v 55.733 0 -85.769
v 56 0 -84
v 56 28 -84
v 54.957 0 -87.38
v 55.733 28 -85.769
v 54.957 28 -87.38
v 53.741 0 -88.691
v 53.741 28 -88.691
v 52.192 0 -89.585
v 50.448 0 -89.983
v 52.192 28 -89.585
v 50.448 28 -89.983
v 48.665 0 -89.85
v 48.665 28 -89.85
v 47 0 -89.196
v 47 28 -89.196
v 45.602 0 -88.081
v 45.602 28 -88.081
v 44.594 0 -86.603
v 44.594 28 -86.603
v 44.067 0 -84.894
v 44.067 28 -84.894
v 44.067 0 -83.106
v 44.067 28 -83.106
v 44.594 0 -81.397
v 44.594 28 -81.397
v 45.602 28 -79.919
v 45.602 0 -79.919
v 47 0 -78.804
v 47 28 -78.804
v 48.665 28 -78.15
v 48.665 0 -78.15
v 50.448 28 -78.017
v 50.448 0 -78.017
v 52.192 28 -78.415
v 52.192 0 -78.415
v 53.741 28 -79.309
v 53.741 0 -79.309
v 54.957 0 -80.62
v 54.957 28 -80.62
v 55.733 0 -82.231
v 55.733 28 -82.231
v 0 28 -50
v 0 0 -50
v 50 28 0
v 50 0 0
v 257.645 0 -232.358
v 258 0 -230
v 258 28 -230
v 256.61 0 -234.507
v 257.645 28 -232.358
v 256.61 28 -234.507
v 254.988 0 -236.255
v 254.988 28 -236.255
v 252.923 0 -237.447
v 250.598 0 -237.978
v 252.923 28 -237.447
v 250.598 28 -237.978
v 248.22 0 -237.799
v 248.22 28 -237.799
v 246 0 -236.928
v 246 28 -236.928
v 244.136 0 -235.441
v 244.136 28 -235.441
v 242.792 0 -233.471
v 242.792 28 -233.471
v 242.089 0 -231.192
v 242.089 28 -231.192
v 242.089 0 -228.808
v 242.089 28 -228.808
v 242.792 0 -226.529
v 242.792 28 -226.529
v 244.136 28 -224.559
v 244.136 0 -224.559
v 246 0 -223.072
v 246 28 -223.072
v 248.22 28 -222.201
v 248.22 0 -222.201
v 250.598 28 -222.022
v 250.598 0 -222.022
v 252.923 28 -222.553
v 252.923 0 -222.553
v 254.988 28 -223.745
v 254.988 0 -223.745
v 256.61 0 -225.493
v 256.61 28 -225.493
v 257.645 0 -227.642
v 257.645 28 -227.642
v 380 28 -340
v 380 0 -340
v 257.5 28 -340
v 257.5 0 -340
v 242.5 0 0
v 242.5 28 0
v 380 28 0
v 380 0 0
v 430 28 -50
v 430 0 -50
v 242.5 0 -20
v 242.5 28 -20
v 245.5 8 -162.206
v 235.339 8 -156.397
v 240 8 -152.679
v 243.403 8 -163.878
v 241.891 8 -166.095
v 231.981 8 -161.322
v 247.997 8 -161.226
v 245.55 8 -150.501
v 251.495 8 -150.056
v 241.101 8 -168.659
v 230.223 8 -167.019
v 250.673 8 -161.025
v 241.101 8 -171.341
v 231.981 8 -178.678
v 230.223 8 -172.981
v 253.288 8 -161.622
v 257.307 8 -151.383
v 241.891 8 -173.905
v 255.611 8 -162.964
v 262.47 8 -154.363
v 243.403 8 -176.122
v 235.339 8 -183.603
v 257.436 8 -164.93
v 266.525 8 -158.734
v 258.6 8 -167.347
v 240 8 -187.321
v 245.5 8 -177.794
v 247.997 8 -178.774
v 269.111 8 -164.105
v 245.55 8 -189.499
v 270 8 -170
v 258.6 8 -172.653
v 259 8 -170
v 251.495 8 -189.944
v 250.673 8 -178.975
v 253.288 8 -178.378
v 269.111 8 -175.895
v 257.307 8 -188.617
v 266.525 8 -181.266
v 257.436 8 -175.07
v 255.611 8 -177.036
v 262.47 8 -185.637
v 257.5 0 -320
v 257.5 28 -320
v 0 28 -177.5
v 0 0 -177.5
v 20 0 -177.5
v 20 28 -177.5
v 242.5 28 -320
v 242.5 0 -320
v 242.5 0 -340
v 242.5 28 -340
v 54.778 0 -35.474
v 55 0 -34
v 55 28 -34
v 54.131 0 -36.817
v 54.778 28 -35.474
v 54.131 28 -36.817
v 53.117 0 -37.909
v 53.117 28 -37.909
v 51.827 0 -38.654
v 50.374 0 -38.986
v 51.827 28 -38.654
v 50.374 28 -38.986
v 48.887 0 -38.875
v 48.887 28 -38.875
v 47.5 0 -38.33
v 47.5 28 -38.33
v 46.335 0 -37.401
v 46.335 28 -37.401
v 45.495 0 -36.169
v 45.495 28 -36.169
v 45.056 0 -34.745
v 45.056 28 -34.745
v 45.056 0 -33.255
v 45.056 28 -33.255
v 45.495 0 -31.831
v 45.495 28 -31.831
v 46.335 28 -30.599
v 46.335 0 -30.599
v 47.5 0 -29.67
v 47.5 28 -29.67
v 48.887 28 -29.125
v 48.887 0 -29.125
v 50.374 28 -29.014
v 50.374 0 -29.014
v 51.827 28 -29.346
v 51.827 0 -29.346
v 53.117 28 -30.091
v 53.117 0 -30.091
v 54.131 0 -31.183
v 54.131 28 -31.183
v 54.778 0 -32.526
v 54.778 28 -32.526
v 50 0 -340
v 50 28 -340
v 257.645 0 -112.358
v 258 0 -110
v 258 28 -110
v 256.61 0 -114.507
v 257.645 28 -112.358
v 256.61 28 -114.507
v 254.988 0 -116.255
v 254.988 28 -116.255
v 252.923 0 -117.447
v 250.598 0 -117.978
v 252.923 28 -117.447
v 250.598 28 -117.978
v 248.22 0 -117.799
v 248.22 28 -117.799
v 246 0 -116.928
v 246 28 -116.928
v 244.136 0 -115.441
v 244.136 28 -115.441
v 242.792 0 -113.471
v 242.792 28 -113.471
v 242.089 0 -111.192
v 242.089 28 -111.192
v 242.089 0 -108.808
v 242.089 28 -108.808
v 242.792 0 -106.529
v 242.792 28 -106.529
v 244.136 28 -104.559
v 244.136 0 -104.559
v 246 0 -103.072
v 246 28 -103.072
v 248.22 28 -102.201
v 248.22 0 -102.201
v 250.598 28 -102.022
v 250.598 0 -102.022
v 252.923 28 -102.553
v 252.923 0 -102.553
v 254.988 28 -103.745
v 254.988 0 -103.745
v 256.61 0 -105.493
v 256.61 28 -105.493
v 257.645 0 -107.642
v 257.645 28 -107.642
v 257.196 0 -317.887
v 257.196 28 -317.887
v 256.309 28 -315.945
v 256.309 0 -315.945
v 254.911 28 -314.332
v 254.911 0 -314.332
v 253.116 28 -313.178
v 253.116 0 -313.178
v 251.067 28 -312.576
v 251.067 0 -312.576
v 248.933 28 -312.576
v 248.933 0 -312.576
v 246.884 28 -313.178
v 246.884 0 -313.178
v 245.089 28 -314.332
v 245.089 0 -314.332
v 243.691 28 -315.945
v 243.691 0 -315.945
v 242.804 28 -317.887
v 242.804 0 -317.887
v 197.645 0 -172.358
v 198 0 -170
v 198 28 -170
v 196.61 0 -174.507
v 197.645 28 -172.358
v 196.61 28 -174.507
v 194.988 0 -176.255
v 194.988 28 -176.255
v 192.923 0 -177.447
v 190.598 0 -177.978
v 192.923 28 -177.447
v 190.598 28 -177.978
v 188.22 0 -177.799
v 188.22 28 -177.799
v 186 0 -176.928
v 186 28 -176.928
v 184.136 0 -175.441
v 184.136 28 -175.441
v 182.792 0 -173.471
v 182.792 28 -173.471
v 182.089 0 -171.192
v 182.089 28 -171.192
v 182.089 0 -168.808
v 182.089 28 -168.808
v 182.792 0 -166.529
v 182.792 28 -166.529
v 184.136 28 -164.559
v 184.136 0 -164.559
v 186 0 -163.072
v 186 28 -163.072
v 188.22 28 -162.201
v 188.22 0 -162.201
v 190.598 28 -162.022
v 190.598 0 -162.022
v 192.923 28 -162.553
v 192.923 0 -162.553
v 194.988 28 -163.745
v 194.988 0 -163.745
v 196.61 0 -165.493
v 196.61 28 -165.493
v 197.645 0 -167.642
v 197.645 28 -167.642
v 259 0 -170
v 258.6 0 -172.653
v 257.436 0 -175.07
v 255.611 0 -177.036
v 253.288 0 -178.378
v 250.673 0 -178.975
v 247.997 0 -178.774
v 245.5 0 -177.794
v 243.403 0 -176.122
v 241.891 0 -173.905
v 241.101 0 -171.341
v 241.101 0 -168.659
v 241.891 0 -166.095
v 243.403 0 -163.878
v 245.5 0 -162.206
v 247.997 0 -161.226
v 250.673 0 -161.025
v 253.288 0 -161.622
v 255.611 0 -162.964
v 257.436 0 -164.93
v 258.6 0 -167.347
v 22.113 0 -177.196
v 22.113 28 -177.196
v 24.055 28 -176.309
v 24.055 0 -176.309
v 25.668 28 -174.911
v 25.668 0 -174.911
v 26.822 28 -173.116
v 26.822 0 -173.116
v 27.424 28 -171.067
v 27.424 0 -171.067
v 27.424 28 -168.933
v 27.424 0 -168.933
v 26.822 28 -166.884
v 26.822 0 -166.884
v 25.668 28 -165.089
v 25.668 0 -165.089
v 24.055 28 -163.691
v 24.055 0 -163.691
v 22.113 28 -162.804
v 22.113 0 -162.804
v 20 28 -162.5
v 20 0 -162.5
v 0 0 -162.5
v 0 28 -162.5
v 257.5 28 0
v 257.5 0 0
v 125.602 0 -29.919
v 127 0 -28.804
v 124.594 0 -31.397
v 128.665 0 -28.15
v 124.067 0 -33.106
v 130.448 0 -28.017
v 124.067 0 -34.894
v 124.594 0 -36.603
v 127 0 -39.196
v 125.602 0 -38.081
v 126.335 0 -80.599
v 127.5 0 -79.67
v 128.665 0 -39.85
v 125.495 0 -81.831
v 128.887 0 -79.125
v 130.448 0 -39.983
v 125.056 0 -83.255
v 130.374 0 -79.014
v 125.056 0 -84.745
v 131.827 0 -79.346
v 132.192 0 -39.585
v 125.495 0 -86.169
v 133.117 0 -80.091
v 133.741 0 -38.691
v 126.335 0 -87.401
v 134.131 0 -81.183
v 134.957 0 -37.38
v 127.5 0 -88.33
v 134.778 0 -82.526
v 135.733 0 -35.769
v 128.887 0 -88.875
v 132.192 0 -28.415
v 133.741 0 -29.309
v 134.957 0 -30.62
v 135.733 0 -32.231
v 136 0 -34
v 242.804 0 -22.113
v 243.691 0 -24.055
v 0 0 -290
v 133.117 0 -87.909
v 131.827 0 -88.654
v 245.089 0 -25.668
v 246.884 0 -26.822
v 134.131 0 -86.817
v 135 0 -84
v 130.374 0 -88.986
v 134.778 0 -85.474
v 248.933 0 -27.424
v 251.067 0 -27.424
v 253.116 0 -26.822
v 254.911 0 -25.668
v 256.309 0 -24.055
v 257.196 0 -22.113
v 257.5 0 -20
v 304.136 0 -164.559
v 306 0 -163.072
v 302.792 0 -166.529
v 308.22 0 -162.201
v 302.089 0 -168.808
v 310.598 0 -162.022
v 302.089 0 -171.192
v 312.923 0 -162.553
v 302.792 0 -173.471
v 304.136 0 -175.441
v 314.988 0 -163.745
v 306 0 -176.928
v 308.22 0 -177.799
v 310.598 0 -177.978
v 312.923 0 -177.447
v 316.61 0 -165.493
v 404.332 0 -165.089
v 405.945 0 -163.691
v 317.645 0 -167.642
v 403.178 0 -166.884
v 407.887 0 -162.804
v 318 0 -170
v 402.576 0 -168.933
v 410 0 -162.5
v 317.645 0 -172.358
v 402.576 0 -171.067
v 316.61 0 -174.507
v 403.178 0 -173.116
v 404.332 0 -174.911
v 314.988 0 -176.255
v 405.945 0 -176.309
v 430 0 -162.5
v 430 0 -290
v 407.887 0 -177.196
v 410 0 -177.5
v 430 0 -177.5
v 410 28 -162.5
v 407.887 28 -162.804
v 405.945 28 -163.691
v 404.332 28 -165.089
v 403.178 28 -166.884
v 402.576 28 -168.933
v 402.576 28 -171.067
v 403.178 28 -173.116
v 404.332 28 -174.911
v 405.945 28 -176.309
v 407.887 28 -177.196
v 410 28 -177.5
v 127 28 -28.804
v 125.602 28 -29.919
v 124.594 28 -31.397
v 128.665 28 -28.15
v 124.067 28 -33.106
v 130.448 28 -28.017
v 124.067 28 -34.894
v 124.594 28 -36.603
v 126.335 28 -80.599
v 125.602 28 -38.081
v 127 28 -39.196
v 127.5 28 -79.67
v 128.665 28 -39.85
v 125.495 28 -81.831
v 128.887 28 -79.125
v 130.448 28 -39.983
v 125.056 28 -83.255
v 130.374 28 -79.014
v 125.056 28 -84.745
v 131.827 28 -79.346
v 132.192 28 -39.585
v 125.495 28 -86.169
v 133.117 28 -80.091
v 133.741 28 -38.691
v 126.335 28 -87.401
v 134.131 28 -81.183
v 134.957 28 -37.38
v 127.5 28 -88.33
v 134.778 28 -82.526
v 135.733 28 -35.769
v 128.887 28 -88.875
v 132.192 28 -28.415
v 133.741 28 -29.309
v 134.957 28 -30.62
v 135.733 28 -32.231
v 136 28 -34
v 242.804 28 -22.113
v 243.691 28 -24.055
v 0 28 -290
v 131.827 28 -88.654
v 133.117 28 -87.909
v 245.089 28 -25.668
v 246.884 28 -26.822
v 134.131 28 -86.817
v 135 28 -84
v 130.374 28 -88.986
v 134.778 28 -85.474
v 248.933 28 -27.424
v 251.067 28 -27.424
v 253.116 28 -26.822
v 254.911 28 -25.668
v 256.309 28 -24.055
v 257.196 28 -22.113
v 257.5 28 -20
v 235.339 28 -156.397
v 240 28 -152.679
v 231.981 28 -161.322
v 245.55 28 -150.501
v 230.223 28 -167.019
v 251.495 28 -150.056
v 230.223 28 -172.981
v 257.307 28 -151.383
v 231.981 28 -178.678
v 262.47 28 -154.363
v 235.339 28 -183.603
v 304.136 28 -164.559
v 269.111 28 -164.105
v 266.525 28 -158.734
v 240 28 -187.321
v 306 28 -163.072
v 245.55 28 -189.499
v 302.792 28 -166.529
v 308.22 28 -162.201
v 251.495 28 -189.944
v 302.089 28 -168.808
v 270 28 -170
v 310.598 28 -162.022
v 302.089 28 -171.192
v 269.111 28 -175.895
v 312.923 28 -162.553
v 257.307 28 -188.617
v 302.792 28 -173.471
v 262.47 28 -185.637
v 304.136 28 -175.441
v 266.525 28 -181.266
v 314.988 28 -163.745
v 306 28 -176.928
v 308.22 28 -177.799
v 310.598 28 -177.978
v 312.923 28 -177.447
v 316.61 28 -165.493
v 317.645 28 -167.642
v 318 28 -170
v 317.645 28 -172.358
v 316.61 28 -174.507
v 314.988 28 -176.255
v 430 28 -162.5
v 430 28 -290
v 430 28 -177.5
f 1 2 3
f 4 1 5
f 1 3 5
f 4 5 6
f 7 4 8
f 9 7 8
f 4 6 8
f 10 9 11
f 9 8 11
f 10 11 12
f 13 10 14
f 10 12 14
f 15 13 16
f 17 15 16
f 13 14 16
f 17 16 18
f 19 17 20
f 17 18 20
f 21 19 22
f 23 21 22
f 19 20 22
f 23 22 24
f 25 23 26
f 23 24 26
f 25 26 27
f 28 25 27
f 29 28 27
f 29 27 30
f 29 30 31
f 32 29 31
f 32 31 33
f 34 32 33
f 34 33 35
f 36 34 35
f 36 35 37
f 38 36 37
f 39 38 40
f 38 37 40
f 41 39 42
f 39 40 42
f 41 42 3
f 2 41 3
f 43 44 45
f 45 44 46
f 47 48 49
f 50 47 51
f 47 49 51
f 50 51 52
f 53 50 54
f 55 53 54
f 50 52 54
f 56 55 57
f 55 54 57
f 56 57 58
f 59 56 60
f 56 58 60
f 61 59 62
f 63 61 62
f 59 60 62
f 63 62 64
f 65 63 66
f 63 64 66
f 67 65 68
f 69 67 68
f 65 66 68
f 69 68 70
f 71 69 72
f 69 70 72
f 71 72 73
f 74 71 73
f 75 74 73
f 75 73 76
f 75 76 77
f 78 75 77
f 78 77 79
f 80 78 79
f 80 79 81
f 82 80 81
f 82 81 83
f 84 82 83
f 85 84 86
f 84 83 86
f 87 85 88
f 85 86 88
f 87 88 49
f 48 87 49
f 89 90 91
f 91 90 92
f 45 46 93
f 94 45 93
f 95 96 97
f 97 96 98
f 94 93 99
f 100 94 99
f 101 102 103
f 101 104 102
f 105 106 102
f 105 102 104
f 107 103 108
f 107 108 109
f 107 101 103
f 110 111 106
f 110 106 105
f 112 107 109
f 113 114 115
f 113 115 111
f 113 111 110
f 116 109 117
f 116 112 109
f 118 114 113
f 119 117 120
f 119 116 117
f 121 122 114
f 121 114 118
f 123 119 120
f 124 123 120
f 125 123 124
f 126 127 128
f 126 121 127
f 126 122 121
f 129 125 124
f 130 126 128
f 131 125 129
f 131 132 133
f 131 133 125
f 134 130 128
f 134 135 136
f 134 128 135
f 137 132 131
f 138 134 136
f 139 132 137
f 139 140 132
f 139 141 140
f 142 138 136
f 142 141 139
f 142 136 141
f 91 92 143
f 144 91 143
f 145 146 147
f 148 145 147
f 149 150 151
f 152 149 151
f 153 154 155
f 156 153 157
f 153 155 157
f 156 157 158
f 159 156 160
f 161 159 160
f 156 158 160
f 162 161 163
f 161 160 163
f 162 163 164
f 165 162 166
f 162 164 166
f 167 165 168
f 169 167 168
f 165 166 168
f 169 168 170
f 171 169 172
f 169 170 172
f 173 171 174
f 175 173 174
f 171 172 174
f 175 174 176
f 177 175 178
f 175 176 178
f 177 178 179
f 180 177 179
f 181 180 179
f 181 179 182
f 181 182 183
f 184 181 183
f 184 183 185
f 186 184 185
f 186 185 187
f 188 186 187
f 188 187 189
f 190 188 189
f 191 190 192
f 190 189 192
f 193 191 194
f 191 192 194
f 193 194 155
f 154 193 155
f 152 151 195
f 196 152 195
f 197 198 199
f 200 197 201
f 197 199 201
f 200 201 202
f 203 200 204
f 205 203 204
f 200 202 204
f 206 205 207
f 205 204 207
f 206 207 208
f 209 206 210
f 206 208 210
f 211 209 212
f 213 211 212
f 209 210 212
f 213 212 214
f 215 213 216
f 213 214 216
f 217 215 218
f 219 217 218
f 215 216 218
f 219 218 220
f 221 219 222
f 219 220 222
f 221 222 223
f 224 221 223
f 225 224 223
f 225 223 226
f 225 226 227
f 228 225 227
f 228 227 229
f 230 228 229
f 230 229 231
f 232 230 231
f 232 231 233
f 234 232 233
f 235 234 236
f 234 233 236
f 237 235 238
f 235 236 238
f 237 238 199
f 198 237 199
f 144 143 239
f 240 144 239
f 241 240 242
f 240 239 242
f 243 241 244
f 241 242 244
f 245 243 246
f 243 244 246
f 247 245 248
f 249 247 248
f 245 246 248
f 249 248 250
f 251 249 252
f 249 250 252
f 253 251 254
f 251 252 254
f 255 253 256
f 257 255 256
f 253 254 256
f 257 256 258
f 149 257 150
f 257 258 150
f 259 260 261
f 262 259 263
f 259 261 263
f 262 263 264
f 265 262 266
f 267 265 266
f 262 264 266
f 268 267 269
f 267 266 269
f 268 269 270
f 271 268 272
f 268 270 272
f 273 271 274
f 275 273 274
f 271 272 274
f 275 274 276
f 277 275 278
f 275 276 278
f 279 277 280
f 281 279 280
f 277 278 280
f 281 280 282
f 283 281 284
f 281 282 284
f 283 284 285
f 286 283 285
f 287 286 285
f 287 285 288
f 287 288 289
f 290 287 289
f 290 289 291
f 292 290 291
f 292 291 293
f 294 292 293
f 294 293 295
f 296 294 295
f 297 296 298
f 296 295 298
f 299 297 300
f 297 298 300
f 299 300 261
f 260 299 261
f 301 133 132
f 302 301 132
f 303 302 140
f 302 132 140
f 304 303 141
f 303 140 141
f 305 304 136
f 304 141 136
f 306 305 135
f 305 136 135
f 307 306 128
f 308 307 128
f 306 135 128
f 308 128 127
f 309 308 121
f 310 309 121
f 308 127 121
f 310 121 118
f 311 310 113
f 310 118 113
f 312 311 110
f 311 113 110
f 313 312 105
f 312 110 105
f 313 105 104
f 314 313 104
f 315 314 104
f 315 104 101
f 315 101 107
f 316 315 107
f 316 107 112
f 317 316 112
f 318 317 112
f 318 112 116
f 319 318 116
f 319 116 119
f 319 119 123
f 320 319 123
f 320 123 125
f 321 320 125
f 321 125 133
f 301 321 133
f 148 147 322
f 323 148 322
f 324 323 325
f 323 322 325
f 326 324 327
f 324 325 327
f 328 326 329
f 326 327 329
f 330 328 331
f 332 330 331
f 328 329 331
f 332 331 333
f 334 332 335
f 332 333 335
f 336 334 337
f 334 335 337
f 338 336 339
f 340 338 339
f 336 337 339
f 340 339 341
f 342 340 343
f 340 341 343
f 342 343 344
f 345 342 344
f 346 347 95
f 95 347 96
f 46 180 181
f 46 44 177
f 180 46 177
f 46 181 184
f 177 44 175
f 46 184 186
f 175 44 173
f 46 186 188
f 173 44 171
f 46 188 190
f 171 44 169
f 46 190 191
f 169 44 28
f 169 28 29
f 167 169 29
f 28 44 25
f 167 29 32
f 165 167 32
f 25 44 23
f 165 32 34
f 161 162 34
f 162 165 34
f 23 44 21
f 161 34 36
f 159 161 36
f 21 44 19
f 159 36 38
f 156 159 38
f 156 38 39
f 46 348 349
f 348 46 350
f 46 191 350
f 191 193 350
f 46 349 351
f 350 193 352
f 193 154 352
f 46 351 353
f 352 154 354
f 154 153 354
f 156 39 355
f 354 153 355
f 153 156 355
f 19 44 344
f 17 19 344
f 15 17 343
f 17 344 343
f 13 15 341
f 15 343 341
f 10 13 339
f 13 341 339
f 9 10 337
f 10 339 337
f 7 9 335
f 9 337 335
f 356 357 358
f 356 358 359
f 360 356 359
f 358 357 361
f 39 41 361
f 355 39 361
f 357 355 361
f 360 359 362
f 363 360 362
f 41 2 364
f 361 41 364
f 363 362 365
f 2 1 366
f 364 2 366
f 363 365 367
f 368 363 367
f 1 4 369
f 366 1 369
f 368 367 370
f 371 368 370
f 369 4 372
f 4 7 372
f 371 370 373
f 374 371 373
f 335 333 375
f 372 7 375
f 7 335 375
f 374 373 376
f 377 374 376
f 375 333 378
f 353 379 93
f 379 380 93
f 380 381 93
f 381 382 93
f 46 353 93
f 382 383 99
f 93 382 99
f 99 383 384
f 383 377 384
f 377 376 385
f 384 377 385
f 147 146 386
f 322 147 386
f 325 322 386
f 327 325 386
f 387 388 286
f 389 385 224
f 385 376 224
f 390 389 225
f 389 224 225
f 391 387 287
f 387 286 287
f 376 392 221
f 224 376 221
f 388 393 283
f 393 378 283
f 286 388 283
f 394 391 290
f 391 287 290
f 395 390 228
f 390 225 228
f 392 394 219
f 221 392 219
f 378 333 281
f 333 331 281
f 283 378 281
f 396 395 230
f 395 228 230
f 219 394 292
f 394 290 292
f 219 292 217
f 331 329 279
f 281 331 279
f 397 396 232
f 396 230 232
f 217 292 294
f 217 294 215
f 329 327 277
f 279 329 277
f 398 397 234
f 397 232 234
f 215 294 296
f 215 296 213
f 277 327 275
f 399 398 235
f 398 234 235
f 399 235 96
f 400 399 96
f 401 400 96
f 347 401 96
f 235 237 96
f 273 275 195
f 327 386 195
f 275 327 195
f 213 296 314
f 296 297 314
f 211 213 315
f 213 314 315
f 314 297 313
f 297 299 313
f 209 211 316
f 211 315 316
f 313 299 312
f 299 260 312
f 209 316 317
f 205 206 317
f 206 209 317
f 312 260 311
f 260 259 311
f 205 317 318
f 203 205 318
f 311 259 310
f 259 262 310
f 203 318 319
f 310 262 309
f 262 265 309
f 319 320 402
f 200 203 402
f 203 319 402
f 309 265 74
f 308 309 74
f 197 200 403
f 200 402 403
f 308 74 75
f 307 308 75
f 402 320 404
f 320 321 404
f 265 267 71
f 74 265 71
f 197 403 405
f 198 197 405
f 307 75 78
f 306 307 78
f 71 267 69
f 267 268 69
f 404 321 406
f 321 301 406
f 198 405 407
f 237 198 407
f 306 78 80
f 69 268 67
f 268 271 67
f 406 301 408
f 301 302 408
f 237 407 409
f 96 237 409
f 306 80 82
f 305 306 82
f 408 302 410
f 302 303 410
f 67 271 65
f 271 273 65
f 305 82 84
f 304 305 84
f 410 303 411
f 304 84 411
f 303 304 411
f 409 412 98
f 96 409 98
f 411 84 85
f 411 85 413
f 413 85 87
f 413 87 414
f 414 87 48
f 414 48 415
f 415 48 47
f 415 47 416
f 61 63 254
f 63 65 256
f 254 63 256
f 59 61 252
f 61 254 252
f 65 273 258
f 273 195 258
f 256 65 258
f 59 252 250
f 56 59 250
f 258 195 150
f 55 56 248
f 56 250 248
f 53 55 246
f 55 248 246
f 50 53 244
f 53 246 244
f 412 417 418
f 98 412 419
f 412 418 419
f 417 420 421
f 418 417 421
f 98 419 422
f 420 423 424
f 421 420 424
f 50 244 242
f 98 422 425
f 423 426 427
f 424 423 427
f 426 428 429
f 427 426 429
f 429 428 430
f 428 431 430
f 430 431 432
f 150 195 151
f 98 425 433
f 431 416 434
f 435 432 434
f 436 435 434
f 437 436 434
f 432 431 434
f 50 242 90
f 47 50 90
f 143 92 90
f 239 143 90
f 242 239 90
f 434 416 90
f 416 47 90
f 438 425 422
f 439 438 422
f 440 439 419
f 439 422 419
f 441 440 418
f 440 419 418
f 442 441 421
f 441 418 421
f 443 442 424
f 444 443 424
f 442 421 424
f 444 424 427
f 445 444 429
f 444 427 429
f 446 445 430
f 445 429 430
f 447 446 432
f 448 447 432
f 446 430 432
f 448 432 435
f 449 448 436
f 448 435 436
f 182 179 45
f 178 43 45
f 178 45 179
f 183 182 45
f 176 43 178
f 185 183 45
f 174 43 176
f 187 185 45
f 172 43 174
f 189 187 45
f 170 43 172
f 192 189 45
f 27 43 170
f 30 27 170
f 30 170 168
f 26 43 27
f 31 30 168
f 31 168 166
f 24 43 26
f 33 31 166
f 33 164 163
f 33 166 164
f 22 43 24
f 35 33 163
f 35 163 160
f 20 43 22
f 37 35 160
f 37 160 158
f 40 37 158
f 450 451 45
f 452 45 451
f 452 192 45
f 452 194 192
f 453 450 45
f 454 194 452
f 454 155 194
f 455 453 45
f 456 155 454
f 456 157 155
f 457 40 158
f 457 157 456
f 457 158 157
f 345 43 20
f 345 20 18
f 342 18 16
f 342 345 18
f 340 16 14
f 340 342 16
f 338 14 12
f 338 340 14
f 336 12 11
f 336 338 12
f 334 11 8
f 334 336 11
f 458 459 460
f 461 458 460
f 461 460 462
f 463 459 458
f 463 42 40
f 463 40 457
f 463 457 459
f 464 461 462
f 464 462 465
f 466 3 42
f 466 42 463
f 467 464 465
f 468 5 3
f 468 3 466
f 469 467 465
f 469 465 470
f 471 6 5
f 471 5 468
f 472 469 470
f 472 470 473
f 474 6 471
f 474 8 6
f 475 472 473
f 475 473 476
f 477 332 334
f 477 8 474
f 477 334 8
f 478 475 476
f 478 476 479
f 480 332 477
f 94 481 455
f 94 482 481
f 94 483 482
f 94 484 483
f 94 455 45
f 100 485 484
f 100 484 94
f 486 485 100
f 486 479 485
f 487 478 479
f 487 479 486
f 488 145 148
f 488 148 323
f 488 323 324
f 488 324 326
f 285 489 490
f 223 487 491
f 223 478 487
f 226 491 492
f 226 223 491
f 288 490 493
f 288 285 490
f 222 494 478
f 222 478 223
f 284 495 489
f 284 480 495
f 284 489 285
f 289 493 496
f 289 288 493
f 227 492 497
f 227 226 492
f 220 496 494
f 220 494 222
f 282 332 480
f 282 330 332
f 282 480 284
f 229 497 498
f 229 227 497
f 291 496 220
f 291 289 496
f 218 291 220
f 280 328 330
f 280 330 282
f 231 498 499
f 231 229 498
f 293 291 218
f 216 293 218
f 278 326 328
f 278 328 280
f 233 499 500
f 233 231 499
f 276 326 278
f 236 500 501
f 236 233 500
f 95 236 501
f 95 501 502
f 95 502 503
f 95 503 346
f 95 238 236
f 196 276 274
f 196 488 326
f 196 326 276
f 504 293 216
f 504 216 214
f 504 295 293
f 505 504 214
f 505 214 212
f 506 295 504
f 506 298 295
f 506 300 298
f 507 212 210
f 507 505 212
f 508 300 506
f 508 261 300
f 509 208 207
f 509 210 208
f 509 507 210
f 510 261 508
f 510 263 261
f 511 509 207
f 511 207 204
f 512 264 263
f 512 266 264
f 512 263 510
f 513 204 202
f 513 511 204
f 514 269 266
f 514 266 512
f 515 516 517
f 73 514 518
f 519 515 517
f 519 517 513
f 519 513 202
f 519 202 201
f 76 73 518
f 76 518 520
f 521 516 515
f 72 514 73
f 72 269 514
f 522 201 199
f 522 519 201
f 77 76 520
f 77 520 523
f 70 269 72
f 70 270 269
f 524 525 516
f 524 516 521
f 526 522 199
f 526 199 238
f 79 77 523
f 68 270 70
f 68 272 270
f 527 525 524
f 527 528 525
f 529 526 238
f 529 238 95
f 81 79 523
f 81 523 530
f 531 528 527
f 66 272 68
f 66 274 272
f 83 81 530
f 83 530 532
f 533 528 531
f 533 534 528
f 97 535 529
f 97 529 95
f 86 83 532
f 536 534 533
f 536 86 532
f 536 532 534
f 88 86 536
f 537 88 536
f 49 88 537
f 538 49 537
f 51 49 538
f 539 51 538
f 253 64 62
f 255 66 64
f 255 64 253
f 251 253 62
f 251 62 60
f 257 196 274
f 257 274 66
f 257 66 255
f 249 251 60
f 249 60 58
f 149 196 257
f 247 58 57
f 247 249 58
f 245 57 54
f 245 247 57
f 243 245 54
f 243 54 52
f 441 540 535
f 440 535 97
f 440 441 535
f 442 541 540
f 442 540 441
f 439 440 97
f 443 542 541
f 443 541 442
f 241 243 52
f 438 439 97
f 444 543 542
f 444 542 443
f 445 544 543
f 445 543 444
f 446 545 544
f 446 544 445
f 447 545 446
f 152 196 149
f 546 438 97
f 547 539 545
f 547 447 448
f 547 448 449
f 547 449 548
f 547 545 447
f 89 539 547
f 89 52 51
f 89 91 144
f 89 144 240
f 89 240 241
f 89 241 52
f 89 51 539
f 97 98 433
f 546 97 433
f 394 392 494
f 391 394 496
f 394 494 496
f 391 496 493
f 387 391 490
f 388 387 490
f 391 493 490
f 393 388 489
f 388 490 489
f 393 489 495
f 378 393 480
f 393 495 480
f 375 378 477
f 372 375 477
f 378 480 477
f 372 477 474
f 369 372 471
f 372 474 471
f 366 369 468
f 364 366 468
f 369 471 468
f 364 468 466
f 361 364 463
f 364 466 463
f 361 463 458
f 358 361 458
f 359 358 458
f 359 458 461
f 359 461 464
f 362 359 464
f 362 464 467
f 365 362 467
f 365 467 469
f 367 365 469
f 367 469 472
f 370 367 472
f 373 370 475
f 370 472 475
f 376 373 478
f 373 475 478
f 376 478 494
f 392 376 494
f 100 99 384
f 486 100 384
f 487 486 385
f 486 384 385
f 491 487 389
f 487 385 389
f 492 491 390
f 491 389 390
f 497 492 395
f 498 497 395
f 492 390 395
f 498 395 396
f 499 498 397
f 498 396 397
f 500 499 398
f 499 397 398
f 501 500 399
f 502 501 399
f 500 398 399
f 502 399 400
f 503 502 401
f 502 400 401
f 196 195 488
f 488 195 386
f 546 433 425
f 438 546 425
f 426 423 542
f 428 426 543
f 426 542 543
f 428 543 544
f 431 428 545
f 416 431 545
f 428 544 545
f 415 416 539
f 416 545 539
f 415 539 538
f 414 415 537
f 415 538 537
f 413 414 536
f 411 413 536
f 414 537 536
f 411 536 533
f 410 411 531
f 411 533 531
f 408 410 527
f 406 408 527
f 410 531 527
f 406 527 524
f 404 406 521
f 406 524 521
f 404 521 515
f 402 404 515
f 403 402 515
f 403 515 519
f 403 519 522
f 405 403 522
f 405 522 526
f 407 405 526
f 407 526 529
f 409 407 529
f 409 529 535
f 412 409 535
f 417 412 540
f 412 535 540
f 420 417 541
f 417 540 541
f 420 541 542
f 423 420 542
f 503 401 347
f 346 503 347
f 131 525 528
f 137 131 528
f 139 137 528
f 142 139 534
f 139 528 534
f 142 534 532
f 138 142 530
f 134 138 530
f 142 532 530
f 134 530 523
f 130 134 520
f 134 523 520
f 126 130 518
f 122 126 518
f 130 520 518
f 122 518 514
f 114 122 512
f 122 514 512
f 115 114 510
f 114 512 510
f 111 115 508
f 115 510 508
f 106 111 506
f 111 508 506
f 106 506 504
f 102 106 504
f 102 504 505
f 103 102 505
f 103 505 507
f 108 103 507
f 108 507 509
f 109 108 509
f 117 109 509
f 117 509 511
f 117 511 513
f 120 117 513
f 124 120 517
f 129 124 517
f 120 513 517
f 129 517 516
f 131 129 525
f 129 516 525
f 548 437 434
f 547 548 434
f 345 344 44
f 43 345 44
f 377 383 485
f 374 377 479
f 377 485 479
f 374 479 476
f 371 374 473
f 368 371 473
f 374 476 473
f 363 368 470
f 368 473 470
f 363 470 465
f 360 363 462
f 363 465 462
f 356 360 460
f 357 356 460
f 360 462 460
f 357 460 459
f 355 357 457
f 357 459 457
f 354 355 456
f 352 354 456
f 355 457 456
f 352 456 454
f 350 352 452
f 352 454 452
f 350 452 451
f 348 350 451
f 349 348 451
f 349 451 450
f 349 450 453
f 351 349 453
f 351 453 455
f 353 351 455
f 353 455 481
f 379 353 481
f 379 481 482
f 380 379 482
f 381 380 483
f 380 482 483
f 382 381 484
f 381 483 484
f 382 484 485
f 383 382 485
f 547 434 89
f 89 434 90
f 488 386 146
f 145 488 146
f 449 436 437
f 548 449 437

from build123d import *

# Parameters (mm, degrees)
EXTRUDE_1_DEPTH     = 28
SKETCH_2_R          = 8
CUT_EXTRUDE_1_DEPTH = 28
SKETCH_3_R          = 6
SKETCH_3_R_2        = 5
CUT_EXTRUDE_2_DEPTH = 28
SKETCH_4_R          = 20
CUT_EXTRUDE_3_DEPTH = 20
SKETCH_5_R          = 9
CUT_EXTRUDE_4_DEPTH = 20


with BuildPart() as part:
    # Эскиз1 → Бобышка-Вытянуть1 (new body)
    with BuildSketch(Plane(origin=(0, 0, 0), x_dir=(1, 0, 0), z_dir=(0, 1, 0))):
        with BuildLine():
            Line((0, 50), (50, 0))
            Line((50, 0), (242.5, 0))
            Line((242.5, 0), (242.5, 20))
            ThreePointArc((242.5, 20), (250, 27.5), (257.5, 20))
            Line((257.5, 20), (257.5, 0))
            Line((257.5, 0), (380, 0))
            Line((380, 0), (430, 50))
            Line((430, 50), (430, 162.5))
            Line((430, 162.5), (410, 162.5))
            ThreePointArc((410, 162.5), (402.5, 170), (410, 177.5))
            Line((410, 177.5), (430, 177.5))
            Line((430, 177.5), (430, 290))
            Line((430, 290), (380, 340))
            Line((380, 340), (257.5, 340))
            Line((257.5, 340), (257.5, 320))
            ThreePointArc((257.5, 320), (250, 312.5), (242.5, 320))
            Line((242.5, 320), (242.5, 340))
            Line((242.5, 340), (50, 340))
            Line((50, 340), (0, 290))
            Line((0, 290), (0, 177.5))
            Line((0, 177.5), (20, 177.5))
            ThreePointArc((20, 177.5), (27.5, 170), (20, 162.5))
            Line((20, 162.5), (0, 162.5))
            Line((0, 162.5), (0, 50))
        make_face()
    extrude(amount=EXTRUDE_1_DEPTH)

    # Эскиз2 → Вырез-Вытянуть1 (cut)
    with BuildSketch(Plane(origin=(0, 28, 0), x_dir=(1, 0, 0), z_dir=(0, 1, 0))):
        with Locations((250, 230)):
            Circle(SKETCH_2_R)
        with Locations((190, 170)):
            Circle(SKETCH_2_R)
        with Locations((250, 110)):
            Circle(SKETCH_2_R)
        with Locations((310, 170)):
            Circle(SKETCH_2_R)
    extrude(amount=-CUT_EXTRUDE_1_DEPTH, mode=Mode.SUBTRACT)

    # Эскиз3 → Вырез-Вытянуть2 (cut)
    with BuildSketch(Plane(origin=(0, 28, 0), x_dir=(1, 0, 0), z_dir=(0, 1, 0))):
        with Locations((50, 84)):
            Circle(SKETCH_3_R)
        with Locations((130, 84)):
            Circle(SKETCH_3_R_2)
        with Locations((50, 34)):
            Circle(SKETCH_3_R_2)
        with Locations((130, 34)):
            Circle(SKETCH_3_R)
    extrude(amount=-CUT_EXTRUDE_2_DEPTH, mode=Mode.SUBTRACT)

    # Эскиз4 → Вырез-Вытянуть3 (cut)
    with BuildSketch(Plane(origin=(0, 28, 0), x_dir=(1, 0, 0), z_dir=(0, 1, 0))):
        with Locations((250, 170)):
            Circle(SKETCH_4_R)
    extrude(amount=-CUT_EXTRUDE_3_DEPTH, mode=Mode.SUBTRACT)

    # Эскиз5 → Вырез-Вытянуть4 (cut)
    with BuildSketch(Plane(origin=(0, 8, 0), x_dir=(1, 0, 0), z_dir=(0, 1, 0))):
        with Locations((250, 170)):
            Circle(SKETCH_5_R)
    extrude(amount=-CUT_EXTRUDE_4_DEPTH, mode=Mode.SUBTRACT)


solid = part.part
